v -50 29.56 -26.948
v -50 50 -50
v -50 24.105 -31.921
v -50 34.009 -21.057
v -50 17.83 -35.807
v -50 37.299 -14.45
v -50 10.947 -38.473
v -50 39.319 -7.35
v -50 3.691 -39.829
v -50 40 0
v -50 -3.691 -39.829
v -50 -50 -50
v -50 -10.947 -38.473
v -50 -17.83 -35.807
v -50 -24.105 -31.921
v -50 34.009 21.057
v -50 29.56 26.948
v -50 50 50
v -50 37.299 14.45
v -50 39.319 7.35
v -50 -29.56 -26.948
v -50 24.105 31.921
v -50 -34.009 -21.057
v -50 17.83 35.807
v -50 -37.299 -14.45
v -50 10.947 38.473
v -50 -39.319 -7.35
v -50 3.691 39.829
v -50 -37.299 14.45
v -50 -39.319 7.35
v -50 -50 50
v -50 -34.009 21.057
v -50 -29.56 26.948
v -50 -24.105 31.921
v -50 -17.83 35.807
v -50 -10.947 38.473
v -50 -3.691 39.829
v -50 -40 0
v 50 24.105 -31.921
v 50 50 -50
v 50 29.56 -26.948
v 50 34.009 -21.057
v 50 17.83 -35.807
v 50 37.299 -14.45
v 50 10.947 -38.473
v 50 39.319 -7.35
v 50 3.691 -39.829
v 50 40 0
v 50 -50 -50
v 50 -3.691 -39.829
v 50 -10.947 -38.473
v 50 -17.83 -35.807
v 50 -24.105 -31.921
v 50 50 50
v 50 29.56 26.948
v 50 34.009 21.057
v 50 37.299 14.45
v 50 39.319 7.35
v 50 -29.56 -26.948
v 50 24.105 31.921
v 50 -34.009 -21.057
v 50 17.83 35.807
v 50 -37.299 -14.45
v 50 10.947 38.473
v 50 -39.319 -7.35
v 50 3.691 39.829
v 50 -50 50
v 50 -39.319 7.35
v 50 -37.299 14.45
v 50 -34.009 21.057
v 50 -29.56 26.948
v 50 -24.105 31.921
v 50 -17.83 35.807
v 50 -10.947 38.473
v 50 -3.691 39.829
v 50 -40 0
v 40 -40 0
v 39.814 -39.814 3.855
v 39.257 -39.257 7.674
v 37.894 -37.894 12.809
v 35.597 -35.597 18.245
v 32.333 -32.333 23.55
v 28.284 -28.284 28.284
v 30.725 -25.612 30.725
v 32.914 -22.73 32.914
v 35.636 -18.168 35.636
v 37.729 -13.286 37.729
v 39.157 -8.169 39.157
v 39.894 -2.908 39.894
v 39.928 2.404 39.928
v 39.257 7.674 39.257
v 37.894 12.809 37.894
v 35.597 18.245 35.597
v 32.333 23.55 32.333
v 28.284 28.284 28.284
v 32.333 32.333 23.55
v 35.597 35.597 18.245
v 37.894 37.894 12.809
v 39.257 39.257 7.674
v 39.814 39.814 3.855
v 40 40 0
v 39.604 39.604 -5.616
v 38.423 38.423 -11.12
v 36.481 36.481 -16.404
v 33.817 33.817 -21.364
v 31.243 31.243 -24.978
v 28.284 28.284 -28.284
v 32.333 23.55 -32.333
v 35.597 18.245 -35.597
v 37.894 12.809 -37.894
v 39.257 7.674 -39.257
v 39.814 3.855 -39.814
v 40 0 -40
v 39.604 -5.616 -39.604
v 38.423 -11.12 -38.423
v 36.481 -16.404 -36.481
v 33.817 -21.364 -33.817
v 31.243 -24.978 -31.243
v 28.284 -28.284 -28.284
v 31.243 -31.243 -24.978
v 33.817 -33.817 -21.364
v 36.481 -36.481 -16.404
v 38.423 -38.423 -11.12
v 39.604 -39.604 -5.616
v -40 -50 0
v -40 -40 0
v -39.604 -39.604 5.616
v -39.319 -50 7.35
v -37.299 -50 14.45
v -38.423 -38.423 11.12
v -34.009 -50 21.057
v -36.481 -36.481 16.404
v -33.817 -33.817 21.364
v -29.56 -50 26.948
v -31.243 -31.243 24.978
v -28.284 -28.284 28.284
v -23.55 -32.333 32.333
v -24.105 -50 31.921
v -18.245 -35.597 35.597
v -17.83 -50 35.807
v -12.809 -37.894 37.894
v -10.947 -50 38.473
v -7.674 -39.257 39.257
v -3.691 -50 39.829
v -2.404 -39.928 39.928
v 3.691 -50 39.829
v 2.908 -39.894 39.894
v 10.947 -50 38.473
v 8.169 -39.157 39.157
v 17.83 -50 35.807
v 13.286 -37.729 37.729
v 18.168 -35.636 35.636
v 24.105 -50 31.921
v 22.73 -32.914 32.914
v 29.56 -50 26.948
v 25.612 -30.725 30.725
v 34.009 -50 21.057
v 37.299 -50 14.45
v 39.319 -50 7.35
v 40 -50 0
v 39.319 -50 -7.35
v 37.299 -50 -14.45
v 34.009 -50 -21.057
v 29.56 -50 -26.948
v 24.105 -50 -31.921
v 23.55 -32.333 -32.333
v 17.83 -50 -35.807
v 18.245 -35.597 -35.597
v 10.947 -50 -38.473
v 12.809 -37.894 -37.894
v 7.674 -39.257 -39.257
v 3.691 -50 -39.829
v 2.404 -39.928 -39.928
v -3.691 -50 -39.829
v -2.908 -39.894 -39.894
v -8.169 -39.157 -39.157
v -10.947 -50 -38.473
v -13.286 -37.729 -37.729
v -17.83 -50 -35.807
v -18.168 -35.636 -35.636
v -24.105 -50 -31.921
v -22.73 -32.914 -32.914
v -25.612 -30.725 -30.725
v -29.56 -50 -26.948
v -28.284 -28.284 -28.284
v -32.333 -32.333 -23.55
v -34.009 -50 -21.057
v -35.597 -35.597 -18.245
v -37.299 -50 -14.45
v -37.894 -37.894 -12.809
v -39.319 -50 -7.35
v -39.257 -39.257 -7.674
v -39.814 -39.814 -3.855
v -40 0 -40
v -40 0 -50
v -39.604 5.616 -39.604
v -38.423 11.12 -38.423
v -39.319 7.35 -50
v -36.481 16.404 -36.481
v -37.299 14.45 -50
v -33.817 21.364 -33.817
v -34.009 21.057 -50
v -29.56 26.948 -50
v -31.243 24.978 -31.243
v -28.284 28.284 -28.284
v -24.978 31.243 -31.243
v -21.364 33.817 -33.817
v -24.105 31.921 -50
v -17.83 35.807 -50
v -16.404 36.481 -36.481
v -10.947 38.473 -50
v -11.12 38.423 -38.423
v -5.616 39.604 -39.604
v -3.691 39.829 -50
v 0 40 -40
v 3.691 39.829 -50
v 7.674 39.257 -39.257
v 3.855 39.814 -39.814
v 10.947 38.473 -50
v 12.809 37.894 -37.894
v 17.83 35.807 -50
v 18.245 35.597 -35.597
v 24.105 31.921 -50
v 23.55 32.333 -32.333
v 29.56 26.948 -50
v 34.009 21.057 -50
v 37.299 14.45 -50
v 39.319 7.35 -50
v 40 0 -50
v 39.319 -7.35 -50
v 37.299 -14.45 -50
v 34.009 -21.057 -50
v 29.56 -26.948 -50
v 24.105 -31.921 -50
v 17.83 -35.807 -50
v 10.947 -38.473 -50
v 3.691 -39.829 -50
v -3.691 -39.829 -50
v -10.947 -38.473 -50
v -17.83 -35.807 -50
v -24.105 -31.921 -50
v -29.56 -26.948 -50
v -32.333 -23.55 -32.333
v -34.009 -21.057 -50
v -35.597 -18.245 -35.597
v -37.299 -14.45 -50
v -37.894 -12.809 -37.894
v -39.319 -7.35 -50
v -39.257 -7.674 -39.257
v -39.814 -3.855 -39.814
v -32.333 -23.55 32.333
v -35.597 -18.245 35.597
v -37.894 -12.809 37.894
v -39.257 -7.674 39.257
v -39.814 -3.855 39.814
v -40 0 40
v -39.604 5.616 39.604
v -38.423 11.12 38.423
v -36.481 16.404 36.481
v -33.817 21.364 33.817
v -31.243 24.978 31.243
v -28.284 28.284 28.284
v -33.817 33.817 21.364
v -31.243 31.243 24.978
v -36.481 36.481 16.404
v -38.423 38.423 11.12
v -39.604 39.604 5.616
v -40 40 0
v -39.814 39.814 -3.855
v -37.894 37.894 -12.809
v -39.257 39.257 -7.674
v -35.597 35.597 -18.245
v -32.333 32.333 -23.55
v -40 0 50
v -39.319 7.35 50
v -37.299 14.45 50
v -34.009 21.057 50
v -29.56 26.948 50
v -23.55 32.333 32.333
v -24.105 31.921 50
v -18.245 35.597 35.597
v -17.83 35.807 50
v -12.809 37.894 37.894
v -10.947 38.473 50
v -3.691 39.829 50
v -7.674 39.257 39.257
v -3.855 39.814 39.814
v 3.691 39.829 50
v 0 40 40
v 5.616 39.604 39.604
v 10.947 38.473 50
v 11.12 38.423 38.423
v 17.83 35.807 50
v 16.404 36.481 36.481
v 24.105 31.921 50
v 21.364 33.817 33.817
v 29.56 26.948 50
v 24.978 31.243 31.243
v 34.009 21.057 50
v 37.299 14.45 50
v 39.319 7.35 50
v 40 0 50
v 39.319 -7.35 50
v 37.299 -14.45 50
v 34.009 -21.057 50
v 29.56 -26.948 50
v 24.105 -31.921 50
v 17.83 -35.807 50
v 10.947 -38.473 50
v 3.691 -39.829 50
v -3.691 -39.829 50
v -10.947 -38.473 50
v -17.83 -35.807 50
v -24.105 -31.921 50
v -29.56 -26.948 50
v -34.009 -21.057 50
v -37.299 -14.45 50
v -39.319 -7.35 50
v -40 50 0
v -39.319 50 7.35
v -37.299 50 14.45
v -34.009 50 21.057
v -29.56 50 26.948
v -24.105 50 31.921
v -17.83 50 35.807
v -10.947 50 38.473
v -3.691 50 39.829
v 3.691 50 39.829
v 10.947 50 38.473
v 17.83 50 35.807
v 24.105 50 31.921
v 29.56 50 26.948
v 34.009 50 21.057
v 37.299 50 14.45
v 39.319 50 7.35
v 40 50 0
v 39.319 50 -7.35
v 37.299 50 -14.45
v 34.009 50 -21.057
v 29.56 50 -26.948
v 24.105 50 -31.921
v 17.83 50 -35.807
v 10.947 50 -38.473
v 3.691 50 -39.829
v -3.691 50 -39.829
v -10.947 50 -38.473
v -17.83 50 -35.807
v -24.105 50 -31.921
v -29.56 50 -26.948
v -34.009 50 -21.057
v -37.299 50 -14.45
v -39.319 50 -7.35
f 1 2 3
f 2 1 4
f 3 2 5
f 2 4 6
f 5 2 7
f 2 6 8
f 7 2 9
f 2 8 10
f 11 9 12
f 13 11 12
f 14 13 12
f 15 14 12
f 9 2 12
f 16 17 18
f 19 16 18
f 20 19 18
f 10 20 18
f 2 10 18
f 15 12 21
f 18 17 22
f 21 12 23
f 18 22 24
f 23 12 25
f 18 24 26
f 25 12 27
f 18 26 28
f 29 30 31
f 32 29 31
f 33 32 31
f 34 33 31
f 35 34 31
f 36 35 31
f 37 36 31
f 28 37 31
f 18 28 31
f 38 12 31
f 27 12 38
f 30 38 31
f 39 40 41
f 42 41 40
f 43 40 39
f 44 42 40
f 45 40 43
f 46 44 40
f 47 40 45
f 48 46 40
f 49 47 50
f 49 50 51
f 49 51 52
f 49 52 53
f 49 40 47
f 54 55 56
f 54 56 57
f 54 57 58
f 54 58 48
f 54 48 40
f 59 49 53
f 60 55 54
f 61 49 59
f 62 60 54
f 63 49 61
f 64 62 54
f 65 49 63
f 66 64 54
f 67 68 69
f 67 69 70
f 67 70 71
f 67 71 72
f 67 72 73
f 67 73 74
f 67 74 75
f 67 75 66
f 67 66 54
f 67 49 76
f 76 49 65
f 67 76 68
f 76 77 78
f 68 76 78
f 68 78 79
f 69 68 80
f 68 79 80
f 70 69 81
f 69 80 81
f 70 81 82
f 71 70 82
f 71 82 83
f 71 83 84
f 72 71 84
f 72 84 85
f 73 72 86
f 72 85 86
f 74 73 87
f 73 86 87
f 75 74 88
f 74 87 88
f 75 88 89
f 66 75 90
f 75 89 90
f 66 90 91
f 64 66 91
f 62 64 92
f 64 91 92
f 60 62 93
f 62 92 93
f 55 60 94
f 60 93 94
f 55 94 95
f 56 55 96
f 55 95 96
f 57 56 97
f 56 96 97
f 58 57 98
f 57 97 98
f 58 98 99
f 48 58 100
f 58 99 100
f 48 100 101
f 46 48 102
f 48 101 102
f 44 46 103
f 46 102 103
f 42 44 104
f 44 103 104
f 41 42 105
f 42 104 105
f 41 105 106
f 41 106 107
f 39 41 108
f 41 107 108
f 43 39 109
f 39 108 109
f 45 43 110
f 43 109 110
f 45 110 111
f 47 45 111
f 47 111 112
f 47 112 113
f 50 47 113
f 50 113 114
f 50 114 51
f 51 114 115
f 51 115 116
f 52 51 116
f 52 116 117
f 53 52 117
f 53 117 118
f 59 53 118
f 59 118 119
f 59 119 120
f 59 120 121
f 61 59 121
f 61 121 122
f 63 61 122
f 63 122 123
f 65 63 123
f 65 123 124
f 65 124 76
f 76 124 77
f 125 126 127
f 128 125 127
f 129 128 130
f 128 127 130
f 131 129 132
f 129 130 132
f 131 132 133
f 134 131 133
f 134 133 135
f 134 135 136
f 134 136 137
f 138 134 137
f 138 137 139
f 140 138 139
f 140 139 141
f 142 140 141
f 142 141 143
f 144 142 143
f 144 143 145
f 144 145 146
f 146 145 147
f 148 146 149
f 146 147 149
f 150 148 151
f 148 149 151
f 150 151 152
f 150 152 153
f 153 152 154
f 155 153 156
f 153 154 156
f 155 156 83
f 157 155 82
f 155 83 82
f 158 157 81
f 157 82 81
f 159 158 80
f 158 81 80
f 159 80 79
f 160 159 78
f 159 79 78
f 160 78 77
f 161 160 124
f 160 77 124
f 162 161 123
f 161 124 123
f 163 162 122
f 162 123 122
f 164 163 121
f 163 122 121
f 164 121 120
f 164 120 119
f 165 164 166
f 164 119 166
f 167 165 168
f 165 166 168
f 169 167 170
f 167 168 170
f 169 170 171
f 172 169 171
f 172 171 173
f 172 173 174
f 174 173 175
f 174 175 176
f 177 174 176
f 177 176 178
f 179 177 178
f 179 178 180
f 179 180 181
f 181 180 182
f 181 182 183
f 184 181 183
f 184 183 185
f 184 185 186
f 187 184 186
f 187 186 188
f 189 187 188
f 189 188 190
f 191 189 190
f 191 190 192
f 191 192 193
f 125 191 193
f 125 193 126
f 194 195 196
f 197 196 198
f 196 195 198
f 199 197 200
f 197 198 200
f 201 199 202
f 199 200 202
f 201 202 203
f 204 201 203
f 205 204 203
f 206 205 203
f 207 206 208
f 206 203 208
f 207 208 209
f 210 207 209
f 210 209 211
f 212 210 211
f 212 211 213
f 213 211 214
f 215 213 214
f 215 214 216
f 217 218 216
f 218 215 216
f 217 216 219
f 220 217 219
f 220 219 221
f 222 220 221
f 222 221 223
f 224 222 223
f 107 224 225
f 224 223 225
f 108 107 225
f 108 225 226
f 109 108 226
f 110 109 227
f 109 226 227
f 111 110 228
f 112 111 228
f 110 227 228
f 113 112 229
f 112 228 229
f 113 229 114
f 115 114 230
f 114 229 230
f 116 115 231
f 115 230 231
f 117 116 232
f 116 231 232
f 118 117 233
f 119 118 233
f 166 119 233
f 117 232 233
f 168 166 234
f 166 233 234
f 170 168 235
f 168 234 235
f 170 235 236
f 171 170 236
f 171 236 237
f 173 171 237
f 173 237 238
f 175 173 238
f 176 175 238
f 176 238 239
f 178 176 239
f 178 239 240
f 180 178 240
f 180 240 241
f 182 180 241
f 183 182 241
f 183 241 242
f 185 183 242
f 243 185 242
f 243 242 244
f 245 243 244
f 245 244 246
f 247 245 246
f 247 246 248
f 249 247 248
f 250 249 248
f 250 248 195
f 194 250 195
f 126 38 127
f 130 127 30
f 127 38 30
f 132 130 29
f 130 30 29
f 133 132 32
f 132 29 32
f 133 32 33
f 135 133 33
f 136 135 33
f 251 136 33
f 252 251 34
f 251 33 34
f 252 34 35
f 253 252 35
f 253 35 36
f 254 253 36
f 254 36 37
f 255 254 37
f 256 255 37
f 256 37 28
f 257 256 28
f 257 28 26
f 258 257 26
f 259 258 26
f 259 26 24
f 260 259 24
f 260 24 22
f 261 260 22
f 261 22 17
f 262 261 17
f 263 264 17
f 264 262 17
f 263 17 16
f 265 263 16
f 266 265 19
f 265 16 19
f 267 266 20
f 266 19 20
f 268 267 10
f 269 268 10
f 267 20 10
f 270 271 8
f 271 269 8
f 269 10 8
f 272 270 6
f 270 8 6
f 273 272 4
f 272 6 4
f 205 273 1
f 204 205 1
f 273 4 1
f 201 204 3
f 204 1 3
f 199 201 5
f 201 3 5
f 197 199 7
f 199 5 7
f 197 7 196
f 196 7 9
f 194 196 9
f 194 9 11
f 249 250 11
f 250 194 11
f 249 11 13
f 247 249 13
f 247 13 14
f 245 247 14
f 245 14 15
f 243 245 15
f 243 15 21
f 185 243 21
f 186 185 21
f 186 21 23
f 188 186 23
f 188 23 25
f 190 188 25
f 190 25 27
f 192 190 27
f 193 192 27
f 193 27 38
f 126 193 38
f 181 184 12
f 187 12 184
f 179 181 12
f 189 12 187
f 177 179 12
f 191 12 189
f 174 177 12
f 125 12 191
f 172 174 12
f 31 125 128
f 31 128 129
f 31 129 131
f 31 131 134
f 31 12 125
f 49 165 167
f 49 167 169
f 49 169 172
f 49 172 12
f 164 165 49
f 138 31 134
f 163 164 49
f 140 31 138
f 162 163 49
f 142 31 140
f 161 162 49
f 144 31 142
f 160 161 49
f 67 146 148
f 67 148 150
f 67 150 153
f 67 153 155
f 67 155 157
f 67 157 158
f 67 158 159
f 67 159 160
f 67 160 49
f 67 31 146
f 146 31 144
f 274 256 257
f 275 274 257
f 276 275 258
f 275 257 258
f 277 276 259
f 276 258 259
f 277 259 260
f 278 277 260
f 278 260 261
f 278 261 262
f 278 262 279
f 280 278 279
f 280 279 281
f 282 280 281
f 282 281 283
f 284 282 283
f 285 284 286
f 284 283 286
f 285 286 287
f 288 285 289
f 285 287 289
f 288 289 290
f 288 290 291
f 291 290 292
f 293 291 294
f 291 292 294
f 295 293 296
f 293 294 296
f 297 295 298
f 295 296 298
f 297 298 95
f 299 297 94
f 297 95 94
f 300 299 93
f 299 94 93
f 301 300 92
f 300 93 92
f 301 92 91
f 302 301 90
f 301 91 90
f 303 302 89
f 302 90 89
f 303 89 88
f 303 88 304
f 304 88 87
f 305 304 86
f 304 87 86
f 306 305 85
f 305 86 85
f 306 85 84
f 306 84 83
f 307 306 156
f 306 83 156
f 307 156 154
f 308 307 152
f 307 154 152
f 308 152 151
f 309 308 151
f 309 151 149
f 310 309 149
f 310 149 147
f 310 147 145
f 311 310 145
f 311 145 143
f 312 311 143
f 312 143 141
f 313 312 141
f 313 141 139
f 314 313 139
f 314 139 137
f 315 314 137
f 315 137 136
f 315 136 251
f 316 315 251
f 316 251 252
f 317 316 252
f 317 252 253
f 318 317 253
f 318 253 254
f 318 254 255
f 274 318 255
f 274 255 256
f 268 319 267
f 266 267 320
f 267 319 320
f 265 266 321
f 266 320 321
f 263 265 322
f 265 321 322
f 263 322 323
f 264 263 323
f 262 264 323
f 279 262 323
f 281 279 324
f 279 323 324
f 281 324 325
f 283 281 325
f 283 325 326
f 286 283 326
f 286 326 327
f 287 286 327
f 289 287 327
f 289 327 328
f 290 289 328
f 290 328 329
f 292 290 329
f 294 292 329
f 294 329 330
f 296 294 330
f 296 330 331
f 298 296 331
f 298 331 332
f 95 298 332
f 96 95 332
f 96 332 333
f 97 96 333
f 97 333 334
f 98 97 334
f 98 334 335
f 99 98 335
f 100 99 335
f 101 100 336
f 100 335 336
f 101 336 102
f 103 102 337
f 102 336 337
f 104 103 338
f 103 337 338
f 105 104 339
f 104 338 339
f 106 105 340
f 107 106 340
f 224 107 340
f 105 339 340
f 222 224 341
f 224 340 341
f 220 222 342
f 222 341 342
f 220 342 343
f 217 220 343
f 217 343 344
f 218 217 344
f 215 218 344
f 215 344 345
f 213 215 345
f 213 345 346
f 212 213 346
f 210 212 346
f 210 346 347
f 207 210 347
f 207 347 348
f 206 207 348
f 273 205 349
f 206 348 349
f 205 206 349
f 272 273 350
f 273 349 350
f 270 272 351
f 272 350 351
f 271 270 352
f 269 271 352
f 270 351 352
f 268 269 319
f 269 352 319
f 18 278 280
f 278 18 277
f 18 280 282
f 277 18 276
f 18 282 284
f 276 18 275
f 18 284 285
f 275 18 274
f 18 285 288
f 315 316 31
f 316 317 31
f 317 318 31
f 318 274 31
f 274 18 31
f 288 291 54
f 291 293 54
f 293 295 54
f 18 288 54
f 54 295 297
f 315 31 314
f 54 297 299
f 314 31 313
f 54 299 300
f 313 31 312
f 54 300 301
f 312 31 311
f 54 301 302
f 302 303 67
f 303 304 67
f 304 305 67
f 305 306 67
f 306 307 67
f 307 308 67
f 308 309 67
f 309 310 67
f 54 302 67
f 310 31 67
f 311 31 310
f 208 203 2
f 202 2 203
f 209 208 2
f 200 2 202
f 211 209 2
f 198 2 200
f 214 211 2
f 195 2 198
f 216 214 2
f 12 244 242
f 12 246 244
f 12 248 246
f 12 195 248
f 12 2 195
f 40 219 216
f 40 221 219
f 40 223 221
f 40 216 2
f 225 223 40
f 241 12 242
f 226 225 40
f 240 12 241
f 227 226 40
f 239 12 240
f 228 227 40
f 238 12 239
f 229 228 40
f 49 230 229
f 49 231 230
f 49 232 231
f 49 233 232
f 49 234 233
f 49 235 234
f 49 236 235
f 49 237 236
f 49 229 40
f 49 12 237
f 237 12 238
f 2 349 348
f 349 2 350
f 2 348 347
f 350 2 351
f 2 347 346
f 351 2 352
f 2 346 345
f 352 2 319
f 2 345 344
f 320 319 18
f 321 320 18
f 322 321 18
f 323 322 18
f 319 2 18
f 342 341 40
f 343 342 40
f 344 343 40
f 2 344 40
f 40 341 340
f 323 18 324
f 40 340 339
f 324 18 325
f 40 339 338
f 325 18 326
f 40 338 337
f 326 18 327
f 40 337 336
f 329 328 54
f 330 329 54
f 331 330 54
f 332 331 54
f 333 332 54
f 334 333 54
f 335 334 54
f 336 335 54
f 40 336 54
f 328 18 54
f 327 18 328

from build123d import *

# Parameters (mm, degrees)
F0_W       = 100
F0_H       = 100
F1_DEPTH   = 50
F5_D       = 80
F5_ON_F4_D = 80
F5_ON_F3_D = 80


with BuildPart() as f1:
    # F0 (on Front) → F1 (new body, symmetric)
    with BuildSketch(Plane.XZ):
        Rectangle(F0_W, F0_H)
    extrude(amount=F1_DEPTH, both=True)

    # F5 (through all)
    with Locations(Plane.XZ.offset(50)):
        with Locations((0, 0)):
            Hole(F5_D / 2)

    # F5 on F4 (through all)
    with Locations(Plane.XY.offset(50)):
        with Locations((0, 0)):
            Hole(F5_ON_F4_D / 2)

    # F5 on F3 (through all)
    with Locations(Plane.YZ.offset(50)):
        with Locations((0, 0)):
            Hole(F5_ON_F3_D / 2)


solid = f1.part
